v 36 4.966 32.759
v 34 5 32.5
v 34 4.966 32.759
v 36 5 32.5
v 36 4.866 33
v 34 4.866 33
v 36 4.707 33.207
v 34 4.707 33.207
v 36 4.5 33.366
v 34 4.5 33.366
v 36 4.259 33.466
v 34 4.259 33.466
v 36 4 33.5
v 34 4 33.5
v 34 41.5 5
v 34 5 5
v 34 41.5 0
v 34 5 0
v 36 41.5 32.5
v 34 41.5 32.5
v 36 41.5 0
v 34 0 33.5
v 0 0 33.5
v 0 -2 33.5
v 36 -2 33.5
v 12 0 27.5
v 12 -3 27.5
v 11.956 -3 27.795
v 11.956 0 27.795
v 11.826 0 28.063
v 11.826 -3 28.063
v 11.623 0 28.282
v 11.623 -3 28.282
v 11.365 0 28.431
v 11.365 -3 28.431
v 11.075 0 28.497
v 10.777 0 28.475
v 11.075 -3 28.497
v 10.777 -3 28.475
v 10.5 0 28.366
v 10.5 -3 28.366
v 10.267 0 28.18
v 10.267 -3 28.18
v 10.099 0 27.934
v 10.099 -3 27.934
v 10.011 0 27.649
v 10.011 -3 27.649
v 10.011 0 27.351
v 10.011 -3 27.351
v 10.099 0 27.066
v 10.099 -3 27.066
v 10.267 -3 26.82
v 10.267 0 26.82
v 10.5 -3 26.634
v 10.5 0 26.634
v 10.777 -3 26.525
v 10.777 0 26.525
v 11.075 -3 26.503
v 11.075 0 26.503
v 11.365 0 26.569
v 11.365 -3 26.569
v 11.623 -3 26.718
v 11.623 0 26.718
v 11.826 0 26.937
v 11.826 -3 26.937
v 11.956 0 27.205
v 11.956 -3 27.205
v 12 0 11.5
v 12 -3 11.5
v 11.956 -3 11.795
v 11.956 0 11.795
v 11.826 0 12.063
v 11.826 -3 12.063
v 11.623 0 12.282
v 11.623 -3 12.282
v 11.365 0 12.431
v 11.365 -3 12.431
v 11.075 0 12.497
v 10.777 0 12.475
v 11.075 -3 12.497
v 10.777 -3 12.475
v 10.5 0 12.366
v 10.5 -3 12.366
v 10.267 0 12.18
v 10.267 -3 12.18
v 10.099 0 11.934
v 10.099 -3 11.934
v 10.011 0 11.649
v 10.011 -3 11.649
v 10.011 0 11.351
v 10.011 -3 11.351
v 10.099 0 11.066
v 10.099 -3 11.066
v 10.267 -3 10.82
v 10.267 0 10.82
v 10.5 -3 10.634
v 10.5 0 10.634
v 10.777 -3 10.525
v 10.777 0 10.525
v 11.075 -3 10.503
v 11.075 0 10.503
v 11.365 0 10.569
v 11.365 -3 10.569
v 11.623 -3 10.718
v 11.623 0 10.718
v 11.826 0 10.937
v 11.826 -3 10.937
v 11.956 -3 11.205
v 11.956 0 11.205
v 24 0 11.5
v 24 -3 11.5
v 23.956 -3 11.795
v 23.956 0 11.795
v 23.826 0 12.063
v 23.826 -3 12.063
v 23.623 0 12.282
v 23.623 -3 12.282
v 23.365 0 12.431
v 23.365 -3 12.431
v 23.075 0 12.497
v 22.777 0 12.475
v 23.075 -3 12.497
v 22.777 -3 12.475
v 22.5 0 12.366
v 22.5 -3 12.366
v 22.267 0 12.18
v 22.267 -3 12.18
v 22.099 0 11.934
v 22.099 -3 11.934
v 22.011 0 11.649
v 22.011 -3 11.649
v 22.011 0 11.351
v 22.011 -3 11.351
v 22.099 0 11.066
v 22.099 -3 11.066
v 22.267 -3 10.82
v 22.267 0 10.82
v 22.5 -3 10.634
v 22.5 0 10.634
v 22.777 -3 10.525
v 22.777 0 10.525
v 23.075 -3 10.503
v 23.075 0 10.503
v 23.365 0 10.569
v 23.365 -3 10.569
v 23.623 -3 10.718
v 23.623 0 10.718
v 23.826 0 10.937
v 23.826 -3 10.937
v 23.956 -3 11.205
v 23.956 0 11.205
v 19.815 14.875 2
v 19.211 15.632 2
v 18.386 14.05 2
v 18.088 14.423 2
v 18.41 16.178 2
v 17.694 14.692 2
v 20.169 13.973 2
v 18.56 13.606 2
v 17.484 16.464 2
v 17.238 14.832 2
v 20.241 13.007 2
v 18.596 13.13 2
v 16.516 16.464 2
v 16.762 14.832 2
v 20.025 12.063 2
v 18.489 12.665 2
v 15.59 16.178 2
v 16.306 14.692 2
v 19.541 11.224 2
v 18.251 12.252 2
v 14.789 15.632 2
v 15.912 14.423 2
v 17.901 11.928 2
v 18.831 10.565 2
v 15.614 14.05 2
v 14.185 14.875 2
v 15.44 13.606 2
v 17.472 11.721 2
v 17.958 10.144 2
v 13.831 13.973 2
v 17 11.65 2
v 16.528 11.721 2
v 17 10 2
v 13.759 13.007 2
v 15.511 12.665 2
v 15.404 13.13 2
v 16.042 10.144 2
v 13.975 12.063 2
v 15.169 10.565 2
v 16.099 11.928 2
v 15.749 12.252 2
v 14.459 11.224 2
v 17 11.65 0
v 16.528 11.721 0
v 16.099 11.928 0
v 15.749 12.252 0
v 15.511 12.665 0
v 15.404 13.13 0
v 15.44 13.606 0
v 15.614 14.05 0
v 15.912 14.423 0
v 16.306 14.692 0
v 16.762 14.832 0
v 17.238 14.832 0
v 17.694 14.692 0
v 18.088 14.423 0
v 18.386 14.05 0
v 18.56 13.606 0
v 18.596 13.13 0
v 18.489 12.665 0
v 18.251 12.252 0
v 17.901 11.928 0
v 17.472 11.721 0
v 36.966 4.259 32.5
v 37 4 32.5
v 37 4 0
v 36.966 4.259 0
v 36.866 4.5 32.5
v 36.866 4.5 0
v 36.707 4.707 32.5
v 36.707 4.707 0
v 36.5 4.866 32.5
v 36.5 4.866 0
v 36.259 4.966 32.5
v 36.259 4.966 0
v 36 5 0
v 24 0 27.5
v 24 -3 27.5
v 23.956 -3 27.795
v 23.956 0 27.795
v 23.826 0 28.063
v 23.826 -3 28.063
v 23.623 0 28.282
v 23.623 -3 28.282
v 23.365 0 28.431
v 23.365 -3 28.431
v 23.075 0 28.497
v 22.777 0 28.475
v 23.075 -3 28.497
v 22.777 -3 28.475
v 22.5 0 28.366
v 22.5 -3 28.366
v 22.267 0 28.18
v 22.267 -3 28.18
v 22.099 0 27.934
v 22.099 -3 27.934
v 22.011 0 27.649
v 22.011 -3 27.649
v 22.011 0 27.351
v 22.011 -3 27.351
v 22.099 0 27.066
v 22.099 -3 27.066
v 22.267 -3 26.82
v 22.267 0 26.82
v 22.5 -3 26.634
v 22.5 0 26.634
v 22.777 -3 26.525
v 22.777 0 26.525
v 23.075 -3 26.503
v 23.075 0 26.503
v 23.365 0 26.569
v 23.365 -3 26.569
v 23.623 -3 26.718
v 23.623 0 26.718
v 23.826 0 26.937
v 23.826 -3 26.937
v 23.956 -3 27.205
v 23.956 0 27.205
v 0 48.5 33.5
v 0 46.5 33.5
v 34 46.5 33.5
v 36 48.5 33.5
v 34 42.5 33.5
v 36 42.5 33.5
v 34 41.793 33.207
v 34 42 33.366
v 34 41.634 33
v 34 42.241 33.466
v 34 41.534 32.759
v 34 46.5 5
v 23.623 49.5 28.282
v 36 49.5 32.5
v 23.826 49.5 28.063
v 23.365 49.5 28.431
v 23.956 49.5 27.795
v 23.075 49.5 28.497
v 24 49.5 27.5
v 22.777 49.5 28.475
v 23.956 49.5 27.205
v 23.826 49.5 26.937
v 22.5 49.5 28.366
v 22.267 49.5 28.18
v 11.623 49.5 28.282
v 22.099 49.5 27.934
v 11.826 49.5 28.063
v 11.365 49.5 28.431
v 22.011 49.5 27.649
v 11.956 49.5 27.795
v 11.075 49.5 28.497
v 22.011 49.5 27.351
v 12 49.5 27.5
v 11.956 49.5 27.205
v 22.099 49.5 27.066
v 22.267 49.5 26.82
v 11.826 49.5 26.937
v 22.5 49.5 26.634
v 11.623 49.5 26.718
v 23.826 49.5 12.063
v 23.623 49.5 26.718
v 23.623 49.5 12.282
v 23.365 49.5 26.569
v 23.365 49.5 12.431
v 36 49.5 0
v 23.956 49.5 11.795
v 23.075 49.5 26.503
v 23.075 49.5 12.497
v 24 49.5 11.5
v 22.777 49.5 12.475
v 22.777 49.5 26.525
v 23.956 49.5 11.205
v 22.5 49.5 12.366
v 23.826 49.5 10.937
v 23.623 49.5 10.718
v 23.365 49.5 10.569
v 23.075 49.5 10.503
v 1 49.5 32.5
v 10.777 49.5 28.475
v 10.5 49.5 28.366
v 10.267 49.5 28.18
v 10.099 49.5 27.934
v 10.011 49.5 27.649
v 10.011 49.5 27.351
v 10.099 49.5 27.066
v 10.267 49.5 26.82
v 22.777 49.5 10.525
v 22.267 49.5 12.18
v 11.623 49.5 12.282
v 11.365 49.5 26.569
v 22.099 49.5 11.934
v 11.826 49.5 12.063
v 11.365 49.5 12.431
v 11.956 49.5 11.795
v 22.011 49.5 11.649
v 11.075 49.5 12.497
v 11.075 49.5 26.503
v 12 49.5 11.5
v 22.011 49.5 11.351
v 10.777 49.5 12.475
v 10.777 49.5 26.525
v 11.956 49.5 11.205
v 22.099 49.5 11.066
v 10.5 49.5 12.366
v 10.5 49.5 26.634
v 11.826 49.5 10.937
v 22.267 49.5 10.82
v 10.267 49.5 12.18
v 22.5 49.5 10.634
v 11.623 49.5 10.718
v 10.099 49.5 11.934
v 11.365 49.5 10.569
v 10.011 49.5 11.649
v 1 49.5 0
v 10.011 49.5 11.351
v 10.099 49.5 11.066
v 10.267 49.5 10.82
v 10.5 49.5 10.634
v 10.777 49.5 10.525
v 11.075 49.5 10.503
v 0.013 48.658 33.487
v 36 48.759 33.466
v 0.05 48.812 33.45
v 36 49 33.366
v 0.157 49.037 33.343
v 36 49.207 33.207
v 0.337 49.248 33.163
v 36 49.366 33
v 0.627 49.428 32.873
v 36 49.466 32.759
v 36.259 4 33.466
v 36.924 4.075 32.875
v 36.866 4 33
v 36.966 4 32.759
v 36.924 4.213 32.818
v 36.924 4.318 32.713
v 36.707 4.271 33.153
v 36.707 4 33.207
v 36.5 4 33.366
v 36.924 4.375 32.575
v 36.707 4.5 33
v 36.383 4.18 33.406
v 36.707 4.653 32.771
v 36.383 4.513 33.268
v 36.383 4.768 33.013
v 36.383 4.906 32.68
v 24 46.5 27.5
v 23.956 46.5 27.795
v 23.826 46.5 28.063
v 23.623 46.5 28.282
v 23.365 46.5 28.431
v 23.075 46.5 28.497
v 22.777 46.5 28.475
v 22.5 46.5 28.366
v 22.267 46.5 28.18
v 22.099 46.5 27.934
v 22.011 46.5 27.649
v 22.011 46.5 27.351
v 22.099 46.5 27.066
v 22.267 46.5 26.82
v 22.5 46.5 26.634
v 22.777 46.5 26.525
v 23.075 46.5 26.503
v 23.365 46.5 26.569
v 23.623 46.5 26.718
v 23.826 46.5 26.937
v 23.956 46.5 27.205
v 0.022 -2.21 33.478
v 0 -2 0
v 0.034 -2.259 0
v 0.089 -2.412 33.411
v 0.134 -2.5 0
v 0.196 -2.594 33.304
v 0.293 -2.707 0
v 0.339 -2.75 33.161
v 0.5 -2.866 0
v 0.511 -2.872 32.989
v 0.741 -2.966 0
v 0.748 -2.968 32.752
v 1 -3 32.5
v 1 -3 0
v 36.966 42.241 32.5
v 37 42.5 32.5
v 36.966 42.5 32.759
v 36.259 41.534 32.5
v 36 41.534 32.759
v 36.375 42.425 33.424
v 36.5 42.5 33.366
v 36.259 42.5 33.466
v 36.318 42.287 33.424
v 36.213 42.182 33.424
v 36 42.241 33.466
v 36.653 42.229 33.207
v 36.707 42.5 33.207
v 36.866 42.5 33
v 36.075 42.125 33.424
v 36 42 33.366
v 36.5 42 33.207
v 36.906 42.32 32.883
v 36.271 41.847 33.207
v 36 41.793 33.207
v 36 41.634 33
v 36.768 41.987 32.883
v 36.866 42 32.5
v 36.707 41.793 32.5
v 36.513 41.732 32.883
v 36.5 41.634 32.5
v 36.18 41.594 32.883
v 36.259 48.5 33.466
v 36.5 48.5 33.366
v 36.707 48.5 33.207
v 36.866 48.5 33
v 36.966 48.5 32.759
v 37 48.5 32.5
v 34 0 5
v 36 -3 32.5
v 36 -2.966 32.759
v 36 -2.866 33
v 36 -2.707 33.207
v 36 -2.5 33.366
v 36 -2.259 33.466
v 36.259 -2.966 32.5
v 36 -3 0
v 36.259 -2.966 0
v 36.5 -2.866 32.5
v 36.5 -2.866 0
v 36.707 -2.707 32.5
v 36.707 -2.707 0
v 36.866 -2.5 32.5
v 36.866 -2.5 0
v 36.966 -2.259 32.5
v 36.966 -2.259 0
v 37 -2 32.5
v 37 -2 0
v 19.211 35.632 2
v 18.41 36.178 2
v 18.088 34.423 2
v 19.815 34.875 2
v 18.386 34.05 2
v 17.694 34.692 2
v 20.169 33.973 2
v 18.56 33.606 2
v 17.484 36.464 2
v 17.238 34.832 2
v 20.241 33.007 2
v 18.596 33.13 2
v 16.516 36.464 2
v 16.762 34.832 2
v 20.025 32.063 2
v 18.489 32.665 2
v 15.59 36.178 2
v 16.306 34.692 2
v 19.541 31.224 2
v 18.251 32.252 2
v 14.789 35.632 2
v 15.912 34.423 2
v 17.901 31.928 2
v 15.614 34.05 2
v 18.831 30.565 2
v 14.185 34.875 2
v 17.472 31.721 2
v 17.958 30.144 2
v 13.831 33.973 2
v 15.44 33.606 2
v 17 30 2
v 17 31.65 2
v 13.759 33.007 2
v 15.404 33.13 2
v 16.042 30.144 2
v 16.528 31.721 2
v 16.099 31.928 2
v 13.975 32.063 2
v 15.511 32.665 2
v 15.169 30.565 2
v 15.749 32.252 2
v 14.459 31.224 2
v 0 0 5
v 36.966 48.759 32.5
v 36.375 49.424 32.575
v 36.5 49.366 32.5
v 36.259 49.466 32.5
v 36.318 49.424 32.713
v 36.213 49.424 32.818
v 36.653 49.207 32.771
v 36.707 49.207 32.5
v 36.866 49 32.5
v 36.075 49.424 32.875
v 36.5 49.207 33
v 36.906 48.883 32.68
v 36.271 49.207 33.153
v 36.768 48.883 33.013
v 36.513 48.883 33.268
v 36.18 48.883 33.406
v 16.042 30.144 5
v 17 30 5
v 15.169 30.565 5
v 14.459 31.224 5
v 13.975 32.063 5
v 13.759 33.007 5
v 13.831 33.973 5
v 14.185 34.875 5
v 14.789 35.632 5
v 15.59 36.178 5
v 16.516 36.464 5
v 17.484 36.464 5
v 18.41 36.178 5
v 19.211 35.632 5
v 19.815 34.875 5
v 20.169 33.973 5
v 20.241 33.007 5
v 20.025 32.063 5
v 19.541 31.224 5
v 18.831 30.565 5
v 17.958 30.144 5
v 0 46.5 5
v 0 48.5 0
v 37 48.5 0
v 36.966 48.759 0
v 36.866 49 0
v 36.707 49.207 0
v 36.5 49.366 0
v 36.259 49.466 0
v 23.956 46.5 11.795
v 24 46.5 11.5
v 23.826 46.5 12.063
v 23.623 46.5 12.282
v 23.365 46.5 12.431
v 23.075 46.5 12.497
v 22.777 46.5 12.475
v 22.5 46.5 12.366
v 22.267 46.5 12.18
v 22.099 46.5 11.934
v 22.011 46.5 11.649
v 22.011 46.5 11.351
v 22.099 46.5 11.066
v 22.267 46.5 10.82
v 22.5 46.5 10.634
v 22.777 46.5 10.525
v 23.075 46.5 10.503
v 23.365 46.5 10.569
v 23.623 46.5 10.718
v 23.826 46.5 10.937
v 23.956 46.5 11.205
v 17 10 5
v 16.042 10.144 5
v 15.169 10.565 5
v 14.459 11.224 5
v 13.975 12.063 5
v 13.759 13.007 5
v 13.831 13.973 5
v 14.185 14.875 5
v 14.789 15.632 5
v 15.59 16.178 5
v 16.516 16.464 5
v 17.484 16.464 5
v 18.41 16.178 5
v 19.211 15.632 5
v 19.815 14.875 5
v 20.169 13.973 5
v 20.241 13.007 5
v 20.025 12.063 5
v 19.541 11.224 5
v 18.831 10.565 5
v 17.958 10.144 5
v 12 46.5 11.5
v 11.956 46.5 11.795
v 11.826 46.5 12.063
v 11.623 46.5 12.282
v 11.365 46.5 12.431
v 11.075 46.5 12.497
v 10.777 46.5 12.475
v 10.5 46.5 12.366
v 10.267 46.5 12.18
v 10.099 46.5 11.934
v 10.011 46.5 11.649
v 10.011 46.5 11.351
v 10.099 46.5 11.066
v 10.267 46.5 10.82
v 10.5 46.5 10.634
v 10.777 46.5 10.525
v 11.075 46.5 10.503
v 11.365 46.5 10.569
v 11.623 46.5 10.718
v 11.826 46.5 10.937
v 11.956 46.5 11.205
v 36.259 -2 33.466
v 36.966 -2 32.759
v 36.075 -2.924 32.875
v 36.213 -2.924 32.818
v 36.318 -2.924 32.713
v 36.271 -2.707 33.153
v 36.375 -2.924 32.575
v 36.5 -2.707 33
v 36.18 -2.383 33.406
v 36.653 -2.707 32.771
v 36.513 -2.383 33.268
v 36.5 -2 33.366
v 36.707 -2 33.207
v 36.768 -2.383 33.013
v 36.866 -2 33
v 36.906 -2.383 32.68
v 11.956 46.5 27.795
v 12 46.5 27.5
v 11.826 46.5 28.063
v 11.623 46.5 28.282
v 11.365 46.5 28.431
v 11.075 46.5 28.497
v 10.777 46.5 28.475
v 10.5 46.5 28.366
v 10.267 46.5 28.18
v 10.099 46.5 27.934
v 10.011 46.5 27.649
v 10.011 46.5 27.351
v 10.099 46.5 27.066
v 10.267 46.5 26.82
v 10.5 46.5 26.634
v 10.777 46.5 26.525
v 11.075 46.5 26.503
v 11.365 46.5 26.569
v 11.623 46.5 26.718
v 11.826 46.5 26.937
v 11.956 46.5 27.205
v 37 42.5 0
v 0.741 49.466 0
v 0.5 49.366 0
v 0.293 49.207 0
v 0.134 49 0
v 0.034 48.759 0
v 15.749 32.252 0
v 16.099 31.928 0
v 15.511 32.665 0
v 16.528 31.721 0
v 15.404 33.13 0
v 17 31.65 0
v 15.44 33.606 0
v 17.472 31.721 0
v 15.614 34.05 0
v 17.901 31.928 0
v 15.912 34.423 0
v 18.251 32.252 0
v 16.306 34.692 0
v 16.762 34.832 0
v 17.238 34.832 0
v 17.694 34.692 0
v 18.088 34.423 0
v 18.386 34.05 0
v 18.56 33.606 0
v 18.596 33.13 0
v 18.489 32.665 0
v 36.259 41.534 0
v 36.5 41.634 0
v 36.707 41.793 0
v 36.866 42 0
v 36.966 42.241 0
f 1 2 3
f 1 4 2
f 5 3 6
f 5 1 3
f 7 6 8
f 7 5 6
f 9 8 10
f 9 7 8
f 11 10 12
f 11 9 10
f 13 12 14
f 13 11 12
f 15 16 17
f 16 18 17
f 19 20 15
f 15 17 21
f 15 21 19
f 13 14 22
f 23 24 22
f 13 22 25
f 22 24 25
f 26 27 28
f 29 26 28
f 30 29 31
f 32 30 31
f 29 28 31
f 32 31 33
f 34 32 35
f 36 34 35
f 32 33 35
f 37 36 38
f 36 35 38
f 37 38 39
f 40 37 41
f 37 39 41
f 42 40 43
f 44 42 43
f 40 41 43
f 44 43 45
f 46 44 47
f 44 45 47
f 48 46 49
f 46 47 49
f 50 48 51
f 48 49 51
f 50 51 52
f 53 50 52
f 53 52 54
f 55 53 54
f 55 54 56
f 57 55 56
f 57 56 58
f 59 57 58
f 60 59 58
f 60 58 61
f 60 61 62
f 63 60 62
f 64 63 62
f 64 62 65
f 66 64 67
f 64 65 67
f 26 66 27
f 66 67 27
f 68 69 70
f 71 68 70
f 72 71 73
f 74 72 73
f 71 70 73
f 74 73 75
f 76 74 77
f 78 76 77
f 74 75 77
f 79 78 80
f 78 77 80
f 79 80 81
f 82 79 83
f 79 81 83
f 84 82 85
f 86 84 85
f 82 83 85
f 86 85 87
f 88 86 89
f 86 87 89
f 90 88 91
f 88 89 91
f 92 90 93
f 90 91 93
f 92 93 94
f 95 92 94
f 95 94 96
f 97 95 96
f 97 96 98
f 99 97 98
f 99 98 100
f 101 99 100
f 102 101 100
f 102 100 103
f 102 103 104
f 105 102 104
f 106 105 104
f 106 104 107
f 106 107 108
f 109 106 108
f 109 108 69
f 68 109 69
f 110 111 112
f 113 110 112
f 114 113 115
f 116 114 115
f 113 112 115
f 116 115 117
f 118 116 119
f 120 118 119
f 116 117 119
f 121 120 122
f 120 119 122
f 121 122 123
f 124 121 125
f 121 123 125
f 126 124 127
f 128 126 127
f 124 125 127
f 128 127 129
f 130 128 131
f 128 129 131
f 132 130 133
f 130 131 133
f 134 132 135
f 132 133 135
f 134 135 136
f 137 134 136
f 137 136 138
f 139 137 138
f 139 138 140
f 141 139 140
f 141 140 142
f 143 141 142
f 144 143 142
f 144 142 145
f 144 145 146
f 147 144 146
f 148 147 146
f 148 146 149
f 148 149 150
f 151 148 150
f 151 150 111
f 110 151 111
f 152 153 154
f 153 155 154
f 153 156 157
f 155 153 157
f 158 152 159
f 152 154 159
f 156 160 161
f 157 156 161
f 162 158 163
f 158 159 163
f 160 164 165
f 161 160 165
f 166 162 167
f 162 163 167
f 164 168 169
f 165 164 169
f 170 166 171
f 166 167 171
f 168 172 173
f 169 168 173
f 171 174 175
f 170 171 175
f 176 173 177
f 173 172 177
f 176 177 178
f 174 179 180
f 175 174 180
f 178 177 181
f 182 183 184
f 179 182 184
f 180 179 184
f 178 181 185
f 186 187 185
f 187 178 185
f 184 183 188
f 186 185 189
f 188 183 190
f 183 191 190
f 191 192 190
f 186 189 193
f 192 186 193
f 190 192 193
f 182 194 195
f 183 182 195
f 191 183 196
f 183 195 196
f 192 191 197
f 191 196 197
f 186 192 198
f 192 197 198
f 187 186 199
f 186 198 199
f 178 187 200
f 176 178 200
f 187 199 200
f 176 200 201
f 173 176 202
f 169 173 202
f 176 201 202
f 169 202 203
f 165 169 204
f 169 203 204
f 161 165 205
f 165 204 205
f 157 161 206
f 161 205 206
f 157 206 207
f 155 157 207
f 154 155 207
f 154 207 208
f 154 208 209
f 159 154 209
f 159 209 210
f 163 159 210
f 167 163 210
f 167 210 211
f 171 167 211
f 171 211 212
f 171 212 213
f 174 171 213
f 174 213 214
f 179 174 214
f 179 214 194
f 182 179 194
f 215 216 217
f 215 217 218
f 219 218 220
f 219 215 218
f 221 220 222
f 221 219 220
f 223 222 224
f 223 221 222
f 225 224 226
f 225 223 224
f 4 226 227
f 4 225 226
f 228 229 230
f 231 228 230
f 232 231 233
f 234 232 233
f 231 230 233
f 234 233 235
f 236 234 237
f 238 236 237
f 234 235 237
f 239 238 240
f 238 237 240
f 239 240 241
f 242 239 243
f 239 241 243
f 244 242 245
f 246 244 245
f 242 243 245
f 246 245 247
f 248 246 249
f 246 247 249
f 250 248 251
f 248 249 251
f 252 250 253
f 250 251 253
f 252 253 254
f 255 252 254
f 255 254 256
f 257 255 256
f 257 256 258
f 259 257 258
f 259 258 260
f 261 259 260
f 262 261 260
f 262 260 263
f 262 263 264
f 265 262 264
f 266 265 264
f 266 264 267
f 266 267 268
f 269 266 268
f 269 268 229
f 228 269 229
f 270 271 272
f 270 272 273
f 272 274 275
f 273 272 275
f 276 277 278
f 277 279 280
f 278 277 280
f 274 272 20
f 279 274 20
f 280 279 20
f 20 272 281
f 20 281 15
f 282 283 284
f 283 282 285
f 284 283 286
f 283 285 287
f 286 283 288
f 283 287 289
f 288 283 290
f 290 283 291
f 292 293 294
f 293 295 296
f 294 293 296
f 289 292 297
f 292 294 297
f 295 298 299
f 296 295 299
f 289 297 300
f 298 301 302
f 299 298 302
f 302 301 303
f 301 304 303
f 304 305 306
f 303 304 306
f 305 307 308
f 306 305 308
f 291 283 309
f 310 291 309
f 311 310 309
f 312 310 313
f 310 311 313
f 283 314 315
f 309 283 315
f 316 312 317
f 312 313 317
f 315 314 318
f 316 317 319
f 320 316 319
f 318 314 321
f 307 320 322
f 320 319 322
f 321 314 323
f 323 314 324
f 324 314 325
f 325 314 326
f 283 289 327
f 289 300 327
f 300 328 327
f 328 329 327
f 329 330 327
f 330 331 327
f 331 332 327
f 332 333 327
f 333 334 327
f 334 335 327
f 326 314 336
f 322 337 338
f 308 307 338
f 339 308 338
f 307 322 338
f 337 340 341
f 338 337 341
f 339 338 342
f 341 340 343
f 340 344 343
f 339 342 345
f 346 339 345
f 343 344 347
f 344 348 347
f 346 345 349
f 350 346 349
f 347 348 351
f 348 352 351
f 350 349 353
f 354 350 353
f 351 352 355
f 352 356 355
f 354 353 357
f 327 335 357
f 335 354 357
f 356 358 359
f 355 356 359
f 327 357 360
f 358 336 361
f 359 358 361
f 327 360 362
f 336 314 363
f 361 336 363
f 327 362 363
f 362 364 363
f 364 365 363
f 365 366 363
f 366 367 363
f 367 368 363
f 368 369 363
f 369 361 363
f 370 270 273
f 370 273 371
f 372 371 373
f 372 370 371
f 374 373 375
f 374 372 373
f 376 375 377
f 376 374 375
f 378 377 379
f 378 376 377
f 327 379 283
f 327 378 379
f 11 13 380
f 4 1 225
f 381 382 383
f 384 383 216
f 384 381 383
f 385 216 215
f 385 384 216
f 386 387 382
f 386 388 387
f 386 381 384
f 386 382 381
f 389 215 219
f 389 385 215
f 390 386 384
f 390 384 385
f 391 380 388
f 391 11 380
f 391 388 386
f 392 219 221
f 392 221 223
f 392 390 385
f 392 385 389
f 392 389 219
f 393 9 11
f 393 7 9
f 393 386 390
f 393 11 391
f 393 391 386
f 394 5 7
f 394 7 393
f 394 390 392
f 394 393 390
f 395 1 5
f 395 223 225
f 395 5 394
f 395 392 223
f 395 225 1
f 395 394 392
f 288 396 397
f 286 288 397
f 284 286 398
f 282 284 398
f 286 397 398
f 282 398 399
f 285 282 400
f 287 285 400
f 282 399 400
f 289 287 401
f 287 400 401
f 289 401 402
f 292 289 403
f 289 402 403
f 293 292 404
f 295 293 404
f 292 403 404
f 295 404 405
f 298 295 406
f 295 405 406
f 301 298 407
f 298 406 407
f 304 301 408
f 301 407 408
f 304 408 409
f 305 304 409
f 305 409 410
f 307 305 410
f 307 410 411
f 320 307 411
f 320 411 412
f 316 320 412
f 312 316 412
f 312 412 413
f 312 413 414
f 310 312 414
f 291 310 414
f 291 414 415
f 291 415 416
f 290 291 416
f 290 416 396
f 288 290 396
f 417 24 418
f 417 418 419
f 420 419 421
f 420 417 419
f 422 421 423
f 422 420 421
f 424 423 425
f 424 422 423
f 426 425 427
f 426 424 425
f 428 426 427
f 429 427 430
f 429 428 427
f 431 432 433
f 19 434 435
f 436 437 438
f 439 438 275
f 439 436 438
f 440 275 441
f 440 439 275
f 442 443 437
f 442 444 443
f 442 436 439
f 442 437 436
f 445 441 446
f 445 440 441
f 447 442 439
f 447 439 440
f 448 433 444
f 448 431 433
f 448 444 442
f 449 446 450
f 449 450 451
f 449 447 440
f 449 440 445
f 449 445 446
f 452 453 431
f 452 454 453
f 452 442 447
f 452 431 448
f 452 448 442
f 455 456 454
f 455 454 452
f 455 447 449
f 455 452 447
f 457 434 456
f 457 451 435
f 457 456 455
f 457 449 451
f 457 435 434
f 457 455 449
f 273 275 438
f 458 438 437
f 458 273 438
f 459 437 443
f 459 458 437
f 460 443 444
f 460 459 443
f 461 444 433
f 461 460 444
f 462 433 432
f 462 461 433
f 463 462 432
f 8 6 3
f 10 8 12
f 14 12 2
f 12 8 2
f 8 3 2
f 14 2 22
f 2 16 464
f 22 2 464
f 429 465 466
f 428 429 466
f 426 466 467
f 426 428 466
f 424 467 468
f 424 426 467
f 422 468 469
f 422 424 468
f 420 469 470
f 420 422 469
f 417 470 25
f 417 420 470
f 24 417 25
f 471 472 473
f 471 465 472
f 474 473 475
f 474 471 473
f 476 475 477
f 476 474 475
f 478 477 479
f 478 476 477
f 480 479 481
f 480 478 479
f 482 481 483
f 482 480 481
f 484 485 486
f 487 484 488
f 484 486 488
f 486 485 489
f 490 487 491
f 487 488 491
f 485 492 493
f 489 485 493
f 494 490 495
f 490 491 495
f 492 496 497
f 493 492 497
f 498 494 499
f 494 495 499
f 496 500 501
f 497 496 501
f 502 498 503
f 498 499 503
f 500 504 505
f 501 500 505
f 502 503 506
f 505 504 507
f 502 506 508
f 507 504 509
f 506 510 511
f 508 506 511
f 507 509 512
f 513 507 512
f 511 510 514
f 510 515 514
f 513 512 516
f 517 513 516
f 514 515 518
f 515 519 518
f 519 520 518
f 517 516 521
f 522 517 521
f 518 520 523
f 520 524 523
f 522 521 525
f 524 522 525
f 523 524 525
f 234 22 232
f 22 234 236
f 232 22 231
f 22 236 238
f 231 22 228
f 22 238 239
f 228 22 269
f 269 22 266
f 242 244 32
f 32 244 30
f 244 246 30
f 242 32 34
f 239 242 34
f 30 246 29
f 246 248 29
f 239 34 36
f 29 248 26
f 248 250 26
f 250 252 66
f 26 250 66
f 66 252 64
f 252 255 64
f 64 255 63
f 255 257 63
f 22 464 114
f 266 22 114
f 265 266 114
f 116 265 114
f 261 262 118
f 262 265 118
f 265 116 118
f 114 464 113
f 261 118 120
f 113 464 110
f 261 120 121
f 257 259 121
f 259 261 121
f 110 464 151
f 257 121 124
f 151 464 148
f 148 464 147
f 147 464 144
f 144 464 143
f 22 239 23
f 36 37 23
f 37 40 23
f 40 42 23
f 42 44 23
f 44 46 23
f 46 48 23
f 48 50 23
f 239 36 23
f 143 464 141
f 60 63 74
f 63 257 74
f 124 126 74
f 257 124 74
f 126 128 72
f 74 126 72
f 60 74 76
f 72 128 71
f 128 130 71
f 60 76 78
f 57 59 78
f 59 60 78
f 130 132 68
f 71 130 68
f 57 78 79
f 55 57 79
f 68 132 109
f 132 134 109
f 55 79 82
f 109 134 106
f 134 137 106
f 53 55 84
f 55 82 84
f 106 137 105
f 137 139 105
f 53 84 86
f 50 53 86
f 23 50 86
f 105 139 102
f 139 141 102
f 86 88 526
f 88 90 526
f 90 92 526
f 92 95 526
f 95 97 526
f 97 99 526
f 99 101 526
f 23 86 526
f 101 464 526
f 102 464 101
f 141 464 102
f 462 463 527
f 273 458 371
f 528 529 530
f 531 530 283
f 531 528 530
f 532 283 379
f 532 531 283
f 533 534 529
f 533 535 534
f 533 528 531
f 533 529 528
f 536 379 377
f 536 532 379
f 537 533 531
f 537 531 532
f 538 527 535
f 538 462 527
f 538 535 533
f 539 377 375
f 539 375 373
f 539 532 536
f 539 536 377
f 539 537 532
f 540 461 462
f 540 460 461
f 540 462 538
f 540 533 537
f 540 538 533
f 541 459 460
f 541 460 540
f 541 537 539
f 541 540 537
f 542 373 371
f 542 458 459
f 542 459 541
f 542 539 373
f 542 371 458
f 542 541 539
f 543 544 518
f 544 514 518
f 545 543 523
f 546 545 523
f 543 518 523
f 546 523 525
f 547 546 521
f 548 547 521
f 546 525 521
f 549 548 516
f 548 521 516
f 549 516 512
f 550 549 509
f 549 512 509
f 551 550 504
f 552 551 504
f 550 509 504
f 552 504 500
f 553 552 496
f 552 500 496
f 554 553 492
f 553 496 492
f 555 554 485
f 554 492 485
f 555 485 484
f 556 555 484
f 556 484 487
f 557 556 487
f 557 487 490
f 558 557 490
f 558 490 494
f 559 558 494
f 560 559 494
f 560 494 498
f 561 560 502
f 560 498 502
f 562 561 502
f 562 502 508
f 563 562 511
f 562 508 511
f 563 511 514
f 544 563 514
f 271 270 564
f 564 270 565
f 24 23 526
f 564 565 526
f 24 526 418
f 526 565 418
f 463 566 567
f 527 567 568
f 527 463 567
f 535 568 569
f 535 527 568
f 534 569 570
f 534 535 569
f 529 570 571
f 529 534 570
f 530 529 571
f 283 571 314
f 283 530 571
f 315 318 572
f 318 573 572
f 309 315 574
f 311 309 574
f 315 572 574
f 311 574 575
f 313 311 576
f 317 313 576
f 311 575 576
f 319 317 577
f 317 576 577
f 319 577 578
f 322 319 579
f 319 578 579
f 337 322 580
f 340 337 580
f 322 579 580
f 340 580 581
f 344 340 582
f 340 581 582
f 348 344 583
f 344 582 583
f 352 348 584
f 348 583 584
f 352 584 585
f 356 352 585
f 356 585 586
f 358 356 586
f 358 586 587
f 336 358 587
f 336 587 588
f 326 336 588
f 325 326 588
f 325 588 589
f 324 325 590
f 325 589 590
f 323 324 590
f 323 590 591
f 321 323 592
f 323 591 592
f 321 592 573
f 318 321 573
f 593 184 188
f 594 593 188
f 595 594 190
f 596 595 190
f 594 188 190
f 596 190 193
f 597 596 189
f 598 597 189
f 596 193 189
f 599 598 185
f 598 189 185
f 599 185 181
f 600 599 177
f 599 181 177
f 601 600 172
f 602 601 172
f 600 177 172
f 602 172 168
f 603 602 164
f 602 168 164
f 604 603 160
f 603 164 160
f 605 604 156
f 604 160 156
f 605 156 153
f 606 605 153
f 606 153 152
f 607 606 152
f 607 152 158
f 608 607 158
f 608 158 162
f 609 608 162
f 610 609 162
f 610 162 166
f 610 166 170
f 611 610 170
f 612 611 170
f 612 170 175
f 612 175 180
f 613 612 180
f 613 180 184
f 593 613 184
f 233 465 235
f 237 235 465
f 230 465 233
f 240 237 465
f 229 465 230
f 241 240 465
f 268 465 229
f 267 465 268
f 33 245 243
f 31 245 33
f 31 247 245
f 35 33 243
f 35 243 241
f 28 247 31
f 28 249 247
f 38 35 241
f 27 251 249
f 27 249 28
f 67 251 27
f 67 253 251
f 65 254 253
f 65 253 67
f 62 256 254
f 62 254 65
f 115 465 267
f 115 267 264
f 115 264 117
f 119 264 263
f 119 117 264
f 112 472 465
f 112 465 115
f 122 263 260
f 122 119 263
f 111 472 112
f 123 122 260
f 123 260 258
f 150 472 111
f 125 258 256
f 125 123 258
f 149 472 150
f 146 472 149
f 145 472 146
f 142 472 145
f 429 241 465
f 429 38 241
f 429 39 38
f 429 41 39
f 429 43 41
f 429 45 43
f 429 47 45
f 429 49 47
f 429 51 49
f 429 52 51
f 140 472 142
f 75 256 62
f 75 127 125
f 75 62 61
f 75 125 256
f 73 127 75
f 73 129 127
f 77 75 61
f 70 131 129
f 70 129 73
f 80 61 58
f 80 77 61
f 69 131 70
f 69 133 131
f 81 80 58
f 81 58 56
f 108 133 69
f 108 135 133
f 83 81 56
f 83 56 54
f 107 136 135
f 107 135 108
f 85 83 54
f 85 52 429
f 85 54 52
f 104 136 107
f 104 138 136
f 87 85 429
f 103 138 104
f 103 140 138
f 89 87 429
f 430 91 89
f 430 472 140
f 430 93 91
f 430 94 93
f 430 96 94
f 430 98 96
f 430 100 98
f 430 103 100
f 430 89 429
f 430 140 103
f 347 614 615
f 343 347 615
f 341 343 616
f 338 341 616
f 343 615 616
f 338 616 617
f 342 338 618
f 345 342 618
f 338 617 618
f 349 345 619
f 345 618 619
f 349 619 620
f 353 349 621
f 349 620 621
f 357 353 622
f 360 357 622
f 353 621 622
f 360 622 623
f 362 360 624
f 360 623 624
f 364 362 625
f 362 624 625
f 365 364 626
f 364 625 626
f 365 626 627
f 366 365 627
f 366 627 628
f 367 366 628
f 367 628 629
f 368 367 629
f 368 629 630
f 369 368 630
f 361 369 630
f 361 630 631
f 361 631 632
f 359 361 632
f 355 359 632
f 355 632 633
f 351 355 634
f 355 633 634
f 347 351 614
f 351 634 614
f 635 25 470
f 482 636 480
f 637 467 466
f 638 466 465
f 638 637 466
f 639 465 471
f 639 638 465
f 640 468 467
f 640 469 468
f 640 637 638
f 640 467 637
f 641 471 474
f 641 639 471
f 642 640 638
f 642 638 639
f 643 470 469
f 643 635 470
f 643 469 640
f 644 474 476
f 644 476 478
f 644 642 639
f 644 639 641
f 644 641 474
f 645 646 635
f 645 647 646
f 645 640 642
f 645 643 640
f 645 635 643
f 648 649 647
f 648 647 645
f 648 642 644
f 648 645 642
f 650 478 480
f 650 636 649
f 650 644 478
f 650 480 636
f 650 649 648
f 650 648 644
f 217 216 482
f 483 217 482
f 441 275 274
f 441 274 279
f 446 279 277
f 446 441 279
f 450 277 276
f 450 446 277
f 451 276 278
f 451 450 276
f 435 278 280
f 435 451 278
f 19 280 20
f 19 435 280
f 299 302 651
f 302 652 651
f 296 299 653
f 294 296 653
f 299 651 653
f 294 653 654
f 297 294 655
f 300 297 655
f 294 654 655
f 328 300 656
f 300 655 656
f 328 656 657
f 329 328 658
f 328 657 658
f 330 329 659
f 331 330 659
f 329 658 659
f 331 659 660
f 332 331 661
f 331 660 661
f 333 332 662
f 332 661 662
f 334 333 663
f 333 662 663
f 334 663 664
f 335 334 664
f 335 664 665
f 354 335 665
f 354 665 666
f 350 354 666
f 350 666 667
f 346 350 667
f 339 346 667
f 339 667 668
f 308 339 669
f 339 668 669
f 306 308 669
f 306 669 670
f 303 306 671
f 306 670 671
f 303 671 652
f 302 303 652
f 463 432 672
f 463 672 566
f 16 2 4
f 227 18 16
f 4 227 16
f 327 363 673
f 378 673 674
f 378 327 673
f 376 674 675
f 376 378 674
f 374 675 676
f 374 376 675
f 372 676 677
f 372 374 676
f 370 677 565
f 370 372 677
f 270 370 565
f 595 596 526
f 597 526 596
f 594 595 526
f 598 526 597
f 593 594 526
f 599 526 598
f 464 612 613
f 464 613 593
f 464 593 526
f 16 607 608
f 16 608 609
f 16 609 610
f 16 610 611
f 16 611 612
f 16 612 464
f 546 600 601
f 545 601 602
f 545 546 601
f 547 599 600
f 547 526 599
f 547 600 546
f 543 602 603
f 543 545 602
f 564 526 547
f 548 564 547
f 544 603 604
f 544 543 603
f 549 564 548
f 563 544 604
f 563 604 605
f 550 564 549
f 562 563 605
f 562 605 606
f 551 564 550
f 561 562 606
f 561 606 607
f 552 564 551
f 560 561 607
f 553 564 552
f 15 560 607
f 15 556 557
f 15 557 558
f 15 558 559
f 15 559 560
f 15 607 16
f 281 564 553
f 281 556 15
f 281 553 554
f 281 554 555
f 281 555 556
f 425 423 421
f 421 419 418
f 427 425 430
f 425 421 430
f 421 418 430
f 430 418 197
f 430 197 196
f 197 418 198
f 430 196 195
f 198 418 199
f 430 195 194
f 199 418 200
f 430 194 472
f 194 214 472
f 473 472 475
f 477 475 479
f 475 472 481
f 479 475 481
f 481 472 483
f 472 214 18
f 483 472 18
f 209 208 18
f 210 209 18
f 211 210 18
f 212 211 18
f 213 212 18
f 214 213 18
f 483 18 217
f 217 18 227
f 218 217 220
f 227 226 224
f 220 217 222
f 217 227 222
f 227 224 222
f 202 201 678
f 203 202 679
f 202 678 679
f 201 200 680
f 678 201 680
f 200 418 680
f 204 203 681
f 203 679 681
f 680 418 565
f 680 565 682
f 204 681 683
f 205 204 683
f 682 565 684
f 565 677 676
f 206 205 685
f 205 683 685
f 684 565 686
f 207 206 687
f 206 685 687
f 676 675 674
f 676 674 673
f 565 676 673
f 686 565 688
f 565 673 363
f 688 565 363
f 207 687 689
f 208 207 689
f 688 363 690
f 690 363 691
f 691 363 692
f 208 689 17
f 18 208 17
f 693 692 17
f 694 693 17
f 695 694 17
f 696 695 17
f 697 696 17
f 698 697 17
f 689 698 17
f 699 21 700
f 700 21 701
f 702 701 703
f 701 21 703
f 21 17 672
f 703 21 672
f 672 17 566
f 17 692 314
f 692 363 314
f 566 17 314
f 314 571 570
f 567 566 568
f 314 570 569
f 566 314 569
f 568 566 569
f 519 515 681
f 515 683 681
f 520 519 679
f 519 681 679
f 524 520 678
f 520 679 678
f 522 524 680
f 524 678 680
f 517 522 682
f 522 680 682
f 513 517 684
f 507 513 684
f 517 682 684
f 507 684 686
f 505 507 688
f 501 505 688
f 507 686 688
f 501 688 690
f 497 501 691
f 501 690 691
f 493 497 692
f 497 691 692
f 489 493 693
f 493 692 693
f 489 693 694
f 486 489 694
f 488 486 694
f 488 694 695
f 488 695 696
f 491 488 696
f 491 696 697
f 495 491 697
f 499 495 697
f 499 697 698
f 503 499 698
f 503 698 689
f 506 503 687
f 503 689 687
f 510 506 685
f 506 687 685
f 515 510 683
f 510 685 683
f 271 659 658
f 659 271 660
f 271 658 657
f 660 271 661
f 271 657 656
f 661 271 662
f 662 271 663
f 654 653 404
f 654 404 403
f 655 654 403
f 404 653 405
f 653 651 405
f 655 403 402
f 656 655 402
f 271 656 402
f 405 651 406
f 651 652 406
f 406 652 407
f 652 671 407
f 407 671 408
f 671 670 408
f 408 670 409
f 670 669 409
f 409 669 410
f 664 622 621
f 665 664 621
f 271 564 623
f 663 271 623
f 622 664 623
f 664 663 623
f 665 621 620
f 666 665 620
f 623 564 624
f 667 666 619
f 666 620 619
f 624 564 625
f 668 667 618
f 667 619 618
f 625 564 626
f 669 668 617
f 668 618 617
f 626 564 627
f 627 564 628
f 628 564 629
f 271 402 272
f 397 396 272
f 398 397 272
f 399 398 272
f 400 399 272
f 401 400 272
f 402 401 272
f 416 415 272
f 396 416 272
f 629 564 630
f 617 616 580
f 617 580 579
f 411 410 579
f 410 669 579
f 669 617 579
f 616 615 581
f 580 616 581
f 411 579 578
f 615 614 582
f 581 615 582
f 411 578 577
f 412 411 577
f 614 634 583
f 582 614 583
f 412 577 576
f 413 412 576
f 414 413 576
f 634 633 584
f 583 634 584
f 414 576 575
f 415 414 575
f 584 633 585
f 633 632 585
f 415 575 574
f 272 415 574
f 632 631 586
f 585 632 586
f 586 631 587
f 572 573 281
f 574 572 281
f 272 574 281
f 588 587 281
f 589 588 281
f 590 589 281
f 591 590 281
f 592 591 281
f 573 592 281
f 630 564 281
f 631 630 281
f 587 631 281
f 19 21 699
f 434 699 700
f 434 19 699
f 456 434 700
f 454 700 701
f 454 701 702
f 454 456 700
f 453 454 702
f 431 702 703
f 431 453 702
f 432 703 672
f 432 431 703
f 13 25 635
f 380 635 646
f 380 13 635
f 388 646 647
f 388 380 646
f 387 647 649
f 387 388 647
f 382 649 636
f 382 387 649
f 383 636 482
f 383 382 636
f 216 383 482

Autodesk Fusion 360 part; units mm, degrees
sketch "Sketch1" plane through (0, 0, 0) normal (0, 0, 1) x (1, 0, 0)
  line L0 (0, 0) -> (34, 0)
  line L1 (34, 0) -> (34, 46.5)
  line L2 (34, 46.5) -> (0, 46.5)
  line L3 (0, 46.5) -> (0, 0)
  dimension "d1" = 34
  dimension "d2" = 46.5
extrude "Extrude1" add sketch "Sketch1" along normal blind 5
sketch "Sketch3" plane through (0, 0, 5) normal (0, 0, 1) x (-1, 0, 0)
  line L0 (-34, 0) -> (-34, -46.5)
  line L1 (-17, 0) -> (-17, -46.5)
  circle A0 centre (-17, -13.25) radius 1.6
  circle A1 centre (-17, -33.25) radius 1.6
  line L2 (0, -46.5) -> (0, 0)
  line L3 (0, 0) -> (-34, 0)
  line L4 (-34, -46.5) -> (0, -46.5)
  dimension "d11" = 3.2
  dimension "d12" = 3.2
  dimension "d13" = 20
hole "Hole1" at (17, 13.25, 5) at (17, 33.25, 5) direction (0, 0, -1) diameter 3.2 depth 5 tip angle 180 counterbore diameter 6.5 counterbore depth 3
sketch "Sketch4" plane through (0, 0, 0) normal (0, 0, -1) x (1, 0, 0)
  circle A0 centre (17, -13.25) radius 1.6
  circle A1 centre (17, -33.25) radius 1.6
  line L0 (0, 0) -> (0, -46.5)
  line L1 (0, -46.5) -> (34, -46.5)
  line L2 (34, -46.5) -> (34, 0)
  line L3 (34, 0) -> (0, 0)
  line L4 (0, -46.5) -> (37, -46.5)
  line L5 (37, -46.5) -> (37, -49.5)
  line L6 (37, -49.5) -> (0, -49.5)
  line L7 (0, -49.5) -> (0, -46.5)
  line L8 (0, 0) -> (37, 0)
  line L9 (37, 0) -> (37, 3)
  line L10 (37, 3) -> (0, 3)
  line L11 (0, 3) -> (0, 0)
  line L12 (37, 0) -> (34, 0)
  line L13 (34, 0) -> (34, -5)
  line L14 (34, -5) -> (37, -5)
  line L15 (37, -5) -> (37, 0)
  line L16 (37, -46.5) -> (34, -46.5)
  line L17 (34, -46.5) -> (34, -41.5)
  line L18 (34, -41.5) -> (37, -41.5)
  line L19 (37, -41.5) -> (37, -46.5)
  dimension "d24" = 37
  dimension "d25" = 3
  dimension "d26" = 37
  dimension "d27" = 3
  dimension "d28" = 5
  dimension "d29" = 5
extrude "Extrude3" add sketch "Sketch4" against normal blind 33.5 contours L3 L8 L9 L10 L11 L12 | L1 L4 L5 L6 L7 L16 | L2 L8 L12 L13 L14 L15 | L2 L4 L16 L17 L18 L19
sketch "Sketch5" plane through (0, -3, 0) normal (0, -1, 0) x (1, 0, 0)
  line L0 (0, 0) -> (37, 0)
  line L1 (37, 0) -> (37, 33.5)
  line L2 (37, 33.5) -> (0, 33.5)
  line L3 (0, 33.5) -> (0, 0)
  circle A0 centre (11, 27.5) radius 1
  circle A1 centre (23, 27.5) radius 1
  circle A2 centre (11, 11.5) radius 1
  circle A3 centre (23, 11.5) radius 1
  dimension "d32" = 2
  dimension "d33" = 6
  dimension "d34" = 11
  dimension "d37" = 12
  dimension "d38" = -16
extrude "Extrude4" cut sketch "Sketch5" against normal blind 52.5 contours A0 | A1 | A2 | A3
fillet "Fillet3" radius 1 12 edges at (35.5, 5, 33.5) (37, 1, 33.5) (18.5, -3, 33.5) (37, -3, 16.75) (37, 5, 16.75) (0, -3, 16.75) (37, 41.5, 16.75) (37, 45.5, 33.5) (35.5, 41.5, 33.5) (37, 49.5, 16.75) (18.5, 49.5, 33.5) (0, 49.5, 16.75)
